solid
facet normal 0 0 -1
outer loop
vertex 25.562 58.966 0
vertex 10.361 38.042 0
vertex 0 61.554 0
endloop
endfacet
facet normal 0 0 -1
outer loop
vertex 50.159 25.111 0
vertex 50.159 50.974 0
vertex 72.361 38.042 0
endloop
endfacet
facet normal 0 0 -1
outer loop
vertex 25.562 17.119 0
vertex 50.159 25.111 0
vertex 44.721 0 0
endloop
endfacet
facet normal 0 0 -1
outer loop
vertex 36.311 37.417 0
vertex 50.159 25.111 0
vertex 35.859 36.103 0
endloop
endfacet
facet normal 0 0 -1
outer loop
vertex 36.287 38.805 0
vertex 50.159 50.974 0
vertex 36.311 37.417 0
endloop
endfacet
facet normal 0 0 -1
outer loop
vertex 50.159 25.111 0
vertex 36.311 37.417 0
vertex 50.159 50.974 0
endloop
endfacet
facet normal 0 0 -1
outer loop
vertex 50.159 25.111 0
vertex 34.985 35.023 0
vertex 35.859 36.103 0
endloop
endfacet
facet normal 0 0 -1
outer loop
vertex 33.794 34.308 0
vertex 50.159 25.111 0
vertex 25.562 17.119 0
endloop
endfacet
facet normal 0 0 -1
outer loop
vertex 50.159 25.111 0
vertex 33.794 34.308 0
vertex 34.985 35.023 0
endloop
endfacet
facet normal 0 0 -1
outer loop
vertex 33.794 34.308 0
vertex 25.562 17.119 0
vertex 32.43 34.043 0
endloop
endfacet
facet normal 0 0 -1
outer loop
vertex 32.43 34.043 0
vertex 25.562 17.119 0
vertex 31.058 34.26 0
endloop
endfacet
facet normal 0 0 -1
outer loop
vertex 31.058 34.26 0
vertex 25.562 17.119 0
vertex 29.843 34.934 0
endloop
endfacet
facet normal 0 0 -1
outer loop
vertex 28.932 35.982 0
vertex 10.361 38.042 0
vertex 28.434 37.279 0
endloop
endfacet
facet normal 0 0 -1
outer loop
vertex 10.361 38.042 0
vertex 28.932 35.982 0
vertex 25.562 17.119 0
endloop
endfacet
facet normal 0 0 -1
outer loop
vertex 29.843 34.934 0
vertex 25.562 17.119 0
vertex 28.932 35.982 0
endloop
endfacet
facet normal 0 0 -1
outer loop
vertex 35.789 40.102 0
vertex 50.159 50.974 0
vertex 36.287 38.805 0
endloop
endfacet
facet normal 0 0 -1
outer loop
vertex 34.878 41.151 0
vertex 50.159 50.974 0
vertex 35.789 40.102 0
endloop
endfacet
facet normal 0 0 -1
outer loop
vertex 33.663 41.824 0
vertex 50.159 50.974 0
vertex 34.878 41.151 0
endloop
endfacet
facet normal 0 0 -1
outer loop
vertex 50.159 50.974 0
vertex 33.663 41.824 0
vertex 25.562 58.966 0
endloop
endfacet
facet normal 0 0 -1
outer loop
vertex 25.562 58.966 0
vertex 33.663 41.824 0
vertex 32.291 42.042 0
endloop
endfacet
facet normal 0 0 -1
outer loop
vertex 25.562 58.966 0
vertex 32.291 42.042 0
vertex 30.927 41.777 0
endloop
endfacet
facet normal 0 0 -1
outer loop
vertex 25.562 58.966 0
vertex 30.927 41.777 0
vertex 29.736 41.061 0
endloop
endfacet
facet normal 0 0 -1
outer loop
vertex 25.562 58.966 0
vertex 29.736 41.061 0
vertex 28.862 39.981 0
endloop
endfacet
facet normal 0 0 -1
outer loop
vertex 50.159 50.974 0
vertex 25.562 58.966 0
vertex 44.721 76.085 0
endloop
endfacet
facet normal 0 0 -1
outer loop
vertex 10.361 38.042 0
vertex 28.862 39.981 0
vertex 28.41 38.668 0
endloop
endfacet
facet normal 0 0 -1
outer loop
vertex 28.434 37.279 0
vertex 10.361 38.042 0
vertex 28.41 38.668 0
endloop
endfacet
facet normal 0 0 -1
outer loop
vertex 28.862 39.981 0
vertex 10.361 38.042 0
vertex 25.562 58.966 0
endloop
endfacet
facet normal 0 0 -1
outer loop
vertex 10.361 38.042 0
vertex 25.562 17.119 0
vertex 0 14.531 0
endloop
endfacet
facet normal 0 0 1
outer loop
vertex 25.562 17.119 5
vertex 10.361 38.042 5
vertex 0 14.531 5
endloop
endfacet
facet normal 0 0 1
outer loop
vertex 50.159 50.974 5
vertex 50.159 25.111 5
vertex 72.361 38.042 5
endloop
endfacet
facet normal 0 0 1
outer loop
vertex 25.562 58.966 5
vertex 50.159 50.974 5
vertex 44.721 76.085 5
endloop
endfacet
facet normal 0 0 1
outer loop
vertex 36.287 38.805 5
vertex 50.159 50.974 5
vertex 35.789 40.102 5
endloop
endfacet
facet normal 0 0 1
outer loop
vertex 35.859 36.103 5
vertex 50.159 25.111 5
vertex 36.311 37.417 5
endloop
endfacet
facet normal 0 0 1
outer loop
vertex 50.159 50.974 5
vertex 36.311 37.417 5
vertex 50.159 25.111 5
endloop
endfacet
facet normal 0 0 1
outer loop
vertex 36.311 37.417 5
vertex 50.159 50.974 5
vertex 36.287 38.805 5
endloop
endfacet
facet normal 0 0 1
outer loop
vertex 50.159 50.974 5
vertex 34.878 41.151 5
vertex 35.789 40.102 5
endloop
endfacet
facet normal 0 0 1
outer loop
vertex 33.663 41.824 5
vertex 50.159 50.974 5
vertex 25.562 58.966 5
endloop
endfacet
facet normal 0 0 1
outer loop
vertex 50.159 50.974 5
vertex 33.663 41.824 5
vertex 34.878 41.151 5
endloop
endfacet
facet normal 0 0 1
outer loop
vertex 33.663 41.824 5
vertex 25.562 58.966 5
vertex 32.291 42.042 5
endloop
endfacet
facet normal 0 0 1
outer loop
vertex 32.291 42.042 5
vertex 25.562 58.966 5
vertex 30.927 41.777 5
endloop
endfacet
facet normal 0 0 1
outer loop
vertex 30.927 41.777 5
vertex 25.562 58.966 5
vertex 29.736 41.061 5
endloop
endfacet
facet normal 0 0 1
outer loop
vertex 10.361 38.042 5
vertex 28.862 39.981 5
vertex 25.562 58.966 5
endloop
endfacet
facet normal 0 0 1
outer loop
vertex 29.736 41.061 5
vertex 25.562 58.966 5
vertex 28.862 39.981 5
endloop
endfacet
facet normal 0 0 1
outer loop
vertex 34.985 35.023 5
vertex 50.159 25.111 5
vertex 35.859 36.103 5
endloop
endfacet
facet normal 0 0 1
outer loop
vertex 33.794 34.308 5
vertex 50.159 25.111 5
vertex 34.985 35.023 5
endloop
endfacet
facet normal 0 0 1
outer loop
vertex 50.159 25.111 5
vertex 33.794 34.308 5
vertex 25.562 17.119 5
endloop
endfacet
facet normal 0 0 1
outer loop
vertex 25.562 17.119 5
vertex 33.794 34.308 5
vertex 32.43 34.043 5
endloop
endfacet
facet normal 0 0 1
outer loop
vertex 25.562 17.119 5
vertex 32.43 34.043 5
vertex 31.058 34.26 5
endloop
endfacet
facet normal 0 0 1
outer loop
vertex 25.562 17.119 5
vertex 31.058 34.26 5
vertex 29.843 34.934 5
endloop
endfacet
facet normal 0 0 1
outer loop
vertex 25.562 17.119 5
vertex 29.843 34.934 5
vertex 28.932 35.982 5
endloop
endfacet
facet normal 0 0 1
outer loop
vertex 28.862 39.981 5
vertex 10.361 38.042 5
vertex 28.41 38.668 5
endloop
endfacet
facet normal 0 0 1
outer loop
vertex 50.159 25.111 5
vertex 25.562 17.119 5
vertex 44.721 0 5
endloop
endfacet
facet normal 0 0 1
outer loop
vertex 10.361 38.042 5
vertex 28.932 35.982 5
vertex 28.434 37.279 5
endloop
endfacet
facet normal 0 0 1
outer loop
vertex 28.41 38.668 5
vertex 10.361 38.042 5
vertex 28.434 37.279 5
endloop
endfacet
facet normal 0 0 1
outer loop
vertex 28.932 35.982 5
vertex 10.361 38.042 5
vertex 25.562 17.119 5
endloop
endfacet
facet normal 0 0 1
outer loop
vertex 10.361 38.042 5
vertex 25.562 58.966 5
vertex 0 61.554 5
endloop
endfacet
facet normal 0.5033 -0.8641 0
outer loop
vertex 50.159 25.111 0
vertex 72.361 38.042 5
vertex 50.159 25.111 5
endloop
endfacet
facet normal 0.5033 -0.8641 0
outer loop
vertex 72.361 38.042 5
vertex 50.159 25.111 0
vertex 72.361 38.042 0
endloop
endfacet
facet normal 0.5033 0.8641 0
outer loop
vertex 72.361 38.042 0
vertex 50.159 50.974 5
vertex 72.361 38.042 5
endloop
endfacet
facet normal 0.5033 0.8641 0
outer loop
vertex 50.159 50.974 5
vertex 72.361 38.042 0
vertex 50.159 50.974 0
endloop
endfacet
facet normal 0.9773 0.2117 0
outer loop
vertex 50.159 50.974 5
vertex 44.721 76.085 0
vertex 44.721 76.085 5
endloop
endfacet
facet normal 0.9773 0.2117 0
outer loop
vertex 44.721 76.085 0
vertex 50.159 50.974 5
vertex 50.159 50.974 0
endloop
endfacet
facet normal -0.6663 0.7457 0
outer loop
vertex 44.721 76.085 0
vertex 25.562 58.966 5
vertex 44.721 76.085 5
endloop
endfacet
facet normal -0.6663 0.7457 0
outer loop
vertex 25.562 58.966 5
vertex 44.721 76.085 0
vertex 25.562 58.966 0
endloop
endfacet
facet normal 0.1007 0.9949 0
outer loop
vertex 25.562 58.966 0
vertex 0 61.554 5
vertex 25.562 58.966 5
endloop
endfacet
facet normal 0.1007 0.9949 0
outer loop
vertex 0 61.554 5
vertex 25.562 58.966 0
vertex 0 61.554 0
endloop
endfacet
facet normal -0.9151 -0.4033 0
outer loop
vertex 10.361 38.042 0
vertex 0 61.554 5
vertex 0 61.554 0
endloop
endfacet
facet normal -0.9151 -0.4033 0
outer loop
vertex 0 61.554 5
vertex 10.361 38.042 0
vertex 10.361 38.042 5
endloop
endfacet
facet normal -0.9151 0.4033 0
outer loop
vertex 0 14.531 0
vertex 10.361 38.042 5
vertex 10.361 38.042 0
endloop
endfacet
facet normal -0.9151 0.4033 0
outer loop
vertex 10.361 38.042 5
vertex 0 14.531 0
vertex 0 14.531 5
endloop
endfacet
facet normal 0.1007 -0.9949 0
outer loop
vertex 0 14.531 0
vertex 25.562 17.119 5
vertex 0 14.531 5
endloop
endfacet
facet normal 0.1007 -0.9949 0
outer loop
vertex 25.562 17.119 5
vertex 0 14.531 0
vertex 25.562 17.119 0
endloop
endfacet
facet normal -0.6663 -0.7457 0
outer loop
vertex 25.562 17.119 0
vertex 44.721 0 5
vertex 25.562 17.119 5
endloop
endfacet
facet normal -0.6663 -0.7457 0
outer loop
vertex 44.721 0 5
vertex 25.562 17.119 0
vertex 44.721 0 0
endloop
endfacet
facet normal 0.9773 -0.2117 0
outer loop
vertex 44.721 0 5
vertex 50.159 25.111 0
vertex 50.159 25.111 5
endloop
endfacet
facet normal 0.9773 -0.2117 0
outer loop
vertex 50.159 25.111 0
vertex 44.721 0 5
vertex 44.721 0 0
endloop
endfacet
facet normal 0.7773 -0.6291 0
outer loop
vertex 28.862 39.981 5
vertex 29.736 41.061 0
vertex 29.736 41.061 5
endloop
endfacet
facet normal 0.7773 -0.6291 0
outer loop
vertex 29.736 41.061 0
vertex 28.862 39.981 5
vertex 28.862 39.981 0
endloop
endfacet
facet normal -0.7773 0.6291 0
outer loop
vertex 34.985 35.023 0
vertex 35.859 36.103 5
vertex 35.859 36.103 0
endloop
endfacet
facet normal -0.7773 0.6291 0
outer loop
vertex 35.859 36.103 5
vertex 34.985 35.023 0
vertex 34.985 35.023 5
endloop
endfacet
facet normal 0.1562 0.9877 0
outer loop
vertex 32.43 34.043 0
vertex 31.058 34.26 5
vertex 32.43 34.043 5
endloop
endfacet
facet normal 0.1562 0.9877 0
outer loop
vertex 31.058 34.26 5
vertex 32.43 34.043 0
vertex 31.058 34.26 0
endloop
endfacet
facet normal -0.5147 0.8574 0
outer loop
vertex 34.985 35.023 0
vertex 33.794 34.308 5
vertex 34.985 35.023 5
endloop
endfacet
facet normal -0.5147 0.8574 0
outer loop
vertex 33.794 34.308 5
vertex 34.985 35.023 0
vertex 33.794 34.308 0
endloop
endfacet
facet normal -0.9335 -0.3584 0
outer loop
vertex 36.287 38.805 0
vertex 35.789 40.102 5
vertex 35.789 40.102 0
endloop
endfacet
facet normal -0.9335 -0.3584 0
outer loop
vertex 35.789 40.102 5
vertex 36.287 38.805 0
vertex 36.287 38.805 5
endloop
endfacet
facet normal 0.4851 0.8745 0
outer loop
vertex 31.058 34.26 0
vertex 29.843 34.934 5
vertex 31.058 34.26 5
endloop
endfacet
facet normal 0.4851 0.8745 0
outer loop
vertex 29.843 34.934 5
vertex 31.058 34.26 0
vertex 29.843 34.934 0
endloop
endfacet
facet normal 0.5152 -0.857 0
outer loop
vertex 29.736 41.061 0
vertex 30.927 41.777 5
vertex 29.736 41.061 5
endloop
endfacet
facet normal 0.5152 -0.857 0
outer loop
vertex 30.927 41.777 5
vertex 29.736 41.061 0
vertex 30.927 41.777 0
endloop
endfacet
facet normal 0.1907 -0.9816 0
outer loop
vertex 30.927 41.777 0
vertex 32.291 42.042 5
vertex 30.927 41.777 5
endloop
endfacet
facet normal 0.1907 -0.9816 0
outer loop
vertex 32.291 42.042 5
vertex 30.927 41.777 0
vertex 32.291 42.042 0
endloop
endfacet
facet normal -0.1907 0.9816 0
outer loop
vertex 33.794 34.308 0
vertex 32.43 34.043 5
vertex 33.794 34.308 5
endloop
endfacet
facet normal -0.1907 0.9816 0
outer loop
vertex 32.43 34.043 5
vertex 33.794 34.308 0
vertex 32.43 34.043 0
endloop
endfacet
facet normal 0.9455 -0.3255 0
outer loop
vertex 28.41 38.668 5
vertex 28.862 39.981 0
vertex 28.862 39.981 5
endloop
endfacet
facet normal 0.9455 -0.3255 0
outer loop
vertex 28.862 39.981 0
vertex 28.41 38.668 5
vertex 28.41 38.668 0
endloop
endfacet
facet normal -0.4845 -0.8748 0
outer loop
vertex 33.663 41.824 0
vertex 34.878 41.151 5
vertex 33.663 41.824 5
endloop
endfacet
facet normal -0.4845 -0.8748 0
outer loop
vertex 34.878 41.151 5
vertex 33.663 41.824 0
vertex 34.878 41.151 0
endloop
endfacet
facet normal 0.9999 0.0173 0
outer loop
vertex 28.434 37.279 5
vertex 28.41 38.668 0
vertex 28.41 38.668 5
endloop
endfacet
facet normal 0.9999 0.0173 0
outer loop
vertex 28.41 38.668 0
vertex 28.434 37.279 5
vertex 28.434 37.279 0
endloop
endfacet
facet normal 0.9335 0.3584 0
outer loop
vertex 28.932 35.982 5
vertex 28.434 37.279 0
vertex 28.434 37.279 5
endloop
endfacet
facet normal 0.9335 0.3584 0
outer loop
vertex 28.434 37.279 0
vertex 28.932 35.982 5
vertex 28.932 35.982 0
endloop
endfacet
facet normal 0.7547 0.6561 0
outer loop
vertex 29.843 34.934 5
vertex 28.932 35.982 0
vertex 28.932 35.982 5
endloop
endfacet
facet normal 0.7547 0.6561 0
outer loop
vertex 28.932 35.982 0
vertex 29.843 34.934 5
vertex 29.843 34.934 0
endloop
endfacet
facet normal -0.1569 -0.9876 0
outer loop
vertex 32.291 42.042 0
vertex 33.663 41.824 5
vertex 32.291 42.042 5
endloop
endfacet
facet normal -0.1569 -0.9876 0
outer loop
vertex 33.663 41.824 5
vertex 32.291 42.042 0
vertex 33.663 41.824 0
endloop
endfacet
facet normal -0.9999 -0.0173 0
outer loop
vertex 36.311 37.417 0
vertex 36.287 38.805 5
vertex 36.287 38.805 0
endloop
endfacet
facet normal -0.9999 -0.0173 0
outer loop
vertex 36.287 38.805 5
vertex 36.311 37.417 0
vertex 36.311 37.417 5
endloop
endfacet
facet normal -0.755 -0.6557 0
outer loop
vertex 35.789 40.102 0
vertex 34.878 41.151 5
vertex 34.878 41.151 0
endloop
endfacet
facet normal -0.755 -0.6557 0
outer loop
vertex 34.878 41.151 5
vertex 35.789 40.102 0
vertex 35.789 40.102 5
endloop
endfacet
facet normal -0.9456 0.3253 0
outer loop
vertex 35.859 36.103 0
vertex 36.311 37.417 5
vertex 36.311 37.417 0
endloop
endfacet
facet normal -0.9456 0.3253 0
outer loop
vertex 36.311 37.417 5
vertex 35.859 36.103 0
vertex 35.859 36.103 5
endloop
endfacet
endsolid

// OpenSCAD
$fn = 32;

// ----------------------------------------------------------------------
// Star wheel: 5-point star, R40
// ----------------------------------------------------------------------

// --- parameters (mm) ---
n_points = 5;             // number of points / teeth
r_out = 40;               // tip radius
r_in = 22;                // root radius
bore_r = 4;               // centre bore radius
plate_t = 5;              // plate thickness, Z (extrusion height)
bore_d = 8;               // centre bore diameter

profile = [[72.361, 38.042], [50.159, 50.974], [44.721, 76.085], [25.562, 58.966], [0, 61.554], [10.361, 38.042], [0, 14.531], [25.562, 17.119], [44.721, 0], [50.159, 25.111]];  // primary outline, 10 points, counter clockwise
void_1 = [[36.287, 38.805], [35.789, 40.102], [34.878, 41.151], [33.663, 41.824], [32.291, 42.042], [30.927, 41.777], [29.736, 41.061], [28.862, 39.981], [28.41, 38.668], [28.434, 37.279], [28.932, 35.982], [29.843, 34.934], [31.058, 34.26], [32.43, 34.043], [33.794, 34.308], [34.985, 35.023], [35.859, 36.103], [36.311, 37.417]];  // centre bore, 18 points

// --- the one profile operation ---
difference() {
  linear_extrude(height = plate_t) polygon(points = profile);
  translate([0, 0, -1])
    linear_extrude(height = plate_t + 2) polygon(points = void_1);
}
